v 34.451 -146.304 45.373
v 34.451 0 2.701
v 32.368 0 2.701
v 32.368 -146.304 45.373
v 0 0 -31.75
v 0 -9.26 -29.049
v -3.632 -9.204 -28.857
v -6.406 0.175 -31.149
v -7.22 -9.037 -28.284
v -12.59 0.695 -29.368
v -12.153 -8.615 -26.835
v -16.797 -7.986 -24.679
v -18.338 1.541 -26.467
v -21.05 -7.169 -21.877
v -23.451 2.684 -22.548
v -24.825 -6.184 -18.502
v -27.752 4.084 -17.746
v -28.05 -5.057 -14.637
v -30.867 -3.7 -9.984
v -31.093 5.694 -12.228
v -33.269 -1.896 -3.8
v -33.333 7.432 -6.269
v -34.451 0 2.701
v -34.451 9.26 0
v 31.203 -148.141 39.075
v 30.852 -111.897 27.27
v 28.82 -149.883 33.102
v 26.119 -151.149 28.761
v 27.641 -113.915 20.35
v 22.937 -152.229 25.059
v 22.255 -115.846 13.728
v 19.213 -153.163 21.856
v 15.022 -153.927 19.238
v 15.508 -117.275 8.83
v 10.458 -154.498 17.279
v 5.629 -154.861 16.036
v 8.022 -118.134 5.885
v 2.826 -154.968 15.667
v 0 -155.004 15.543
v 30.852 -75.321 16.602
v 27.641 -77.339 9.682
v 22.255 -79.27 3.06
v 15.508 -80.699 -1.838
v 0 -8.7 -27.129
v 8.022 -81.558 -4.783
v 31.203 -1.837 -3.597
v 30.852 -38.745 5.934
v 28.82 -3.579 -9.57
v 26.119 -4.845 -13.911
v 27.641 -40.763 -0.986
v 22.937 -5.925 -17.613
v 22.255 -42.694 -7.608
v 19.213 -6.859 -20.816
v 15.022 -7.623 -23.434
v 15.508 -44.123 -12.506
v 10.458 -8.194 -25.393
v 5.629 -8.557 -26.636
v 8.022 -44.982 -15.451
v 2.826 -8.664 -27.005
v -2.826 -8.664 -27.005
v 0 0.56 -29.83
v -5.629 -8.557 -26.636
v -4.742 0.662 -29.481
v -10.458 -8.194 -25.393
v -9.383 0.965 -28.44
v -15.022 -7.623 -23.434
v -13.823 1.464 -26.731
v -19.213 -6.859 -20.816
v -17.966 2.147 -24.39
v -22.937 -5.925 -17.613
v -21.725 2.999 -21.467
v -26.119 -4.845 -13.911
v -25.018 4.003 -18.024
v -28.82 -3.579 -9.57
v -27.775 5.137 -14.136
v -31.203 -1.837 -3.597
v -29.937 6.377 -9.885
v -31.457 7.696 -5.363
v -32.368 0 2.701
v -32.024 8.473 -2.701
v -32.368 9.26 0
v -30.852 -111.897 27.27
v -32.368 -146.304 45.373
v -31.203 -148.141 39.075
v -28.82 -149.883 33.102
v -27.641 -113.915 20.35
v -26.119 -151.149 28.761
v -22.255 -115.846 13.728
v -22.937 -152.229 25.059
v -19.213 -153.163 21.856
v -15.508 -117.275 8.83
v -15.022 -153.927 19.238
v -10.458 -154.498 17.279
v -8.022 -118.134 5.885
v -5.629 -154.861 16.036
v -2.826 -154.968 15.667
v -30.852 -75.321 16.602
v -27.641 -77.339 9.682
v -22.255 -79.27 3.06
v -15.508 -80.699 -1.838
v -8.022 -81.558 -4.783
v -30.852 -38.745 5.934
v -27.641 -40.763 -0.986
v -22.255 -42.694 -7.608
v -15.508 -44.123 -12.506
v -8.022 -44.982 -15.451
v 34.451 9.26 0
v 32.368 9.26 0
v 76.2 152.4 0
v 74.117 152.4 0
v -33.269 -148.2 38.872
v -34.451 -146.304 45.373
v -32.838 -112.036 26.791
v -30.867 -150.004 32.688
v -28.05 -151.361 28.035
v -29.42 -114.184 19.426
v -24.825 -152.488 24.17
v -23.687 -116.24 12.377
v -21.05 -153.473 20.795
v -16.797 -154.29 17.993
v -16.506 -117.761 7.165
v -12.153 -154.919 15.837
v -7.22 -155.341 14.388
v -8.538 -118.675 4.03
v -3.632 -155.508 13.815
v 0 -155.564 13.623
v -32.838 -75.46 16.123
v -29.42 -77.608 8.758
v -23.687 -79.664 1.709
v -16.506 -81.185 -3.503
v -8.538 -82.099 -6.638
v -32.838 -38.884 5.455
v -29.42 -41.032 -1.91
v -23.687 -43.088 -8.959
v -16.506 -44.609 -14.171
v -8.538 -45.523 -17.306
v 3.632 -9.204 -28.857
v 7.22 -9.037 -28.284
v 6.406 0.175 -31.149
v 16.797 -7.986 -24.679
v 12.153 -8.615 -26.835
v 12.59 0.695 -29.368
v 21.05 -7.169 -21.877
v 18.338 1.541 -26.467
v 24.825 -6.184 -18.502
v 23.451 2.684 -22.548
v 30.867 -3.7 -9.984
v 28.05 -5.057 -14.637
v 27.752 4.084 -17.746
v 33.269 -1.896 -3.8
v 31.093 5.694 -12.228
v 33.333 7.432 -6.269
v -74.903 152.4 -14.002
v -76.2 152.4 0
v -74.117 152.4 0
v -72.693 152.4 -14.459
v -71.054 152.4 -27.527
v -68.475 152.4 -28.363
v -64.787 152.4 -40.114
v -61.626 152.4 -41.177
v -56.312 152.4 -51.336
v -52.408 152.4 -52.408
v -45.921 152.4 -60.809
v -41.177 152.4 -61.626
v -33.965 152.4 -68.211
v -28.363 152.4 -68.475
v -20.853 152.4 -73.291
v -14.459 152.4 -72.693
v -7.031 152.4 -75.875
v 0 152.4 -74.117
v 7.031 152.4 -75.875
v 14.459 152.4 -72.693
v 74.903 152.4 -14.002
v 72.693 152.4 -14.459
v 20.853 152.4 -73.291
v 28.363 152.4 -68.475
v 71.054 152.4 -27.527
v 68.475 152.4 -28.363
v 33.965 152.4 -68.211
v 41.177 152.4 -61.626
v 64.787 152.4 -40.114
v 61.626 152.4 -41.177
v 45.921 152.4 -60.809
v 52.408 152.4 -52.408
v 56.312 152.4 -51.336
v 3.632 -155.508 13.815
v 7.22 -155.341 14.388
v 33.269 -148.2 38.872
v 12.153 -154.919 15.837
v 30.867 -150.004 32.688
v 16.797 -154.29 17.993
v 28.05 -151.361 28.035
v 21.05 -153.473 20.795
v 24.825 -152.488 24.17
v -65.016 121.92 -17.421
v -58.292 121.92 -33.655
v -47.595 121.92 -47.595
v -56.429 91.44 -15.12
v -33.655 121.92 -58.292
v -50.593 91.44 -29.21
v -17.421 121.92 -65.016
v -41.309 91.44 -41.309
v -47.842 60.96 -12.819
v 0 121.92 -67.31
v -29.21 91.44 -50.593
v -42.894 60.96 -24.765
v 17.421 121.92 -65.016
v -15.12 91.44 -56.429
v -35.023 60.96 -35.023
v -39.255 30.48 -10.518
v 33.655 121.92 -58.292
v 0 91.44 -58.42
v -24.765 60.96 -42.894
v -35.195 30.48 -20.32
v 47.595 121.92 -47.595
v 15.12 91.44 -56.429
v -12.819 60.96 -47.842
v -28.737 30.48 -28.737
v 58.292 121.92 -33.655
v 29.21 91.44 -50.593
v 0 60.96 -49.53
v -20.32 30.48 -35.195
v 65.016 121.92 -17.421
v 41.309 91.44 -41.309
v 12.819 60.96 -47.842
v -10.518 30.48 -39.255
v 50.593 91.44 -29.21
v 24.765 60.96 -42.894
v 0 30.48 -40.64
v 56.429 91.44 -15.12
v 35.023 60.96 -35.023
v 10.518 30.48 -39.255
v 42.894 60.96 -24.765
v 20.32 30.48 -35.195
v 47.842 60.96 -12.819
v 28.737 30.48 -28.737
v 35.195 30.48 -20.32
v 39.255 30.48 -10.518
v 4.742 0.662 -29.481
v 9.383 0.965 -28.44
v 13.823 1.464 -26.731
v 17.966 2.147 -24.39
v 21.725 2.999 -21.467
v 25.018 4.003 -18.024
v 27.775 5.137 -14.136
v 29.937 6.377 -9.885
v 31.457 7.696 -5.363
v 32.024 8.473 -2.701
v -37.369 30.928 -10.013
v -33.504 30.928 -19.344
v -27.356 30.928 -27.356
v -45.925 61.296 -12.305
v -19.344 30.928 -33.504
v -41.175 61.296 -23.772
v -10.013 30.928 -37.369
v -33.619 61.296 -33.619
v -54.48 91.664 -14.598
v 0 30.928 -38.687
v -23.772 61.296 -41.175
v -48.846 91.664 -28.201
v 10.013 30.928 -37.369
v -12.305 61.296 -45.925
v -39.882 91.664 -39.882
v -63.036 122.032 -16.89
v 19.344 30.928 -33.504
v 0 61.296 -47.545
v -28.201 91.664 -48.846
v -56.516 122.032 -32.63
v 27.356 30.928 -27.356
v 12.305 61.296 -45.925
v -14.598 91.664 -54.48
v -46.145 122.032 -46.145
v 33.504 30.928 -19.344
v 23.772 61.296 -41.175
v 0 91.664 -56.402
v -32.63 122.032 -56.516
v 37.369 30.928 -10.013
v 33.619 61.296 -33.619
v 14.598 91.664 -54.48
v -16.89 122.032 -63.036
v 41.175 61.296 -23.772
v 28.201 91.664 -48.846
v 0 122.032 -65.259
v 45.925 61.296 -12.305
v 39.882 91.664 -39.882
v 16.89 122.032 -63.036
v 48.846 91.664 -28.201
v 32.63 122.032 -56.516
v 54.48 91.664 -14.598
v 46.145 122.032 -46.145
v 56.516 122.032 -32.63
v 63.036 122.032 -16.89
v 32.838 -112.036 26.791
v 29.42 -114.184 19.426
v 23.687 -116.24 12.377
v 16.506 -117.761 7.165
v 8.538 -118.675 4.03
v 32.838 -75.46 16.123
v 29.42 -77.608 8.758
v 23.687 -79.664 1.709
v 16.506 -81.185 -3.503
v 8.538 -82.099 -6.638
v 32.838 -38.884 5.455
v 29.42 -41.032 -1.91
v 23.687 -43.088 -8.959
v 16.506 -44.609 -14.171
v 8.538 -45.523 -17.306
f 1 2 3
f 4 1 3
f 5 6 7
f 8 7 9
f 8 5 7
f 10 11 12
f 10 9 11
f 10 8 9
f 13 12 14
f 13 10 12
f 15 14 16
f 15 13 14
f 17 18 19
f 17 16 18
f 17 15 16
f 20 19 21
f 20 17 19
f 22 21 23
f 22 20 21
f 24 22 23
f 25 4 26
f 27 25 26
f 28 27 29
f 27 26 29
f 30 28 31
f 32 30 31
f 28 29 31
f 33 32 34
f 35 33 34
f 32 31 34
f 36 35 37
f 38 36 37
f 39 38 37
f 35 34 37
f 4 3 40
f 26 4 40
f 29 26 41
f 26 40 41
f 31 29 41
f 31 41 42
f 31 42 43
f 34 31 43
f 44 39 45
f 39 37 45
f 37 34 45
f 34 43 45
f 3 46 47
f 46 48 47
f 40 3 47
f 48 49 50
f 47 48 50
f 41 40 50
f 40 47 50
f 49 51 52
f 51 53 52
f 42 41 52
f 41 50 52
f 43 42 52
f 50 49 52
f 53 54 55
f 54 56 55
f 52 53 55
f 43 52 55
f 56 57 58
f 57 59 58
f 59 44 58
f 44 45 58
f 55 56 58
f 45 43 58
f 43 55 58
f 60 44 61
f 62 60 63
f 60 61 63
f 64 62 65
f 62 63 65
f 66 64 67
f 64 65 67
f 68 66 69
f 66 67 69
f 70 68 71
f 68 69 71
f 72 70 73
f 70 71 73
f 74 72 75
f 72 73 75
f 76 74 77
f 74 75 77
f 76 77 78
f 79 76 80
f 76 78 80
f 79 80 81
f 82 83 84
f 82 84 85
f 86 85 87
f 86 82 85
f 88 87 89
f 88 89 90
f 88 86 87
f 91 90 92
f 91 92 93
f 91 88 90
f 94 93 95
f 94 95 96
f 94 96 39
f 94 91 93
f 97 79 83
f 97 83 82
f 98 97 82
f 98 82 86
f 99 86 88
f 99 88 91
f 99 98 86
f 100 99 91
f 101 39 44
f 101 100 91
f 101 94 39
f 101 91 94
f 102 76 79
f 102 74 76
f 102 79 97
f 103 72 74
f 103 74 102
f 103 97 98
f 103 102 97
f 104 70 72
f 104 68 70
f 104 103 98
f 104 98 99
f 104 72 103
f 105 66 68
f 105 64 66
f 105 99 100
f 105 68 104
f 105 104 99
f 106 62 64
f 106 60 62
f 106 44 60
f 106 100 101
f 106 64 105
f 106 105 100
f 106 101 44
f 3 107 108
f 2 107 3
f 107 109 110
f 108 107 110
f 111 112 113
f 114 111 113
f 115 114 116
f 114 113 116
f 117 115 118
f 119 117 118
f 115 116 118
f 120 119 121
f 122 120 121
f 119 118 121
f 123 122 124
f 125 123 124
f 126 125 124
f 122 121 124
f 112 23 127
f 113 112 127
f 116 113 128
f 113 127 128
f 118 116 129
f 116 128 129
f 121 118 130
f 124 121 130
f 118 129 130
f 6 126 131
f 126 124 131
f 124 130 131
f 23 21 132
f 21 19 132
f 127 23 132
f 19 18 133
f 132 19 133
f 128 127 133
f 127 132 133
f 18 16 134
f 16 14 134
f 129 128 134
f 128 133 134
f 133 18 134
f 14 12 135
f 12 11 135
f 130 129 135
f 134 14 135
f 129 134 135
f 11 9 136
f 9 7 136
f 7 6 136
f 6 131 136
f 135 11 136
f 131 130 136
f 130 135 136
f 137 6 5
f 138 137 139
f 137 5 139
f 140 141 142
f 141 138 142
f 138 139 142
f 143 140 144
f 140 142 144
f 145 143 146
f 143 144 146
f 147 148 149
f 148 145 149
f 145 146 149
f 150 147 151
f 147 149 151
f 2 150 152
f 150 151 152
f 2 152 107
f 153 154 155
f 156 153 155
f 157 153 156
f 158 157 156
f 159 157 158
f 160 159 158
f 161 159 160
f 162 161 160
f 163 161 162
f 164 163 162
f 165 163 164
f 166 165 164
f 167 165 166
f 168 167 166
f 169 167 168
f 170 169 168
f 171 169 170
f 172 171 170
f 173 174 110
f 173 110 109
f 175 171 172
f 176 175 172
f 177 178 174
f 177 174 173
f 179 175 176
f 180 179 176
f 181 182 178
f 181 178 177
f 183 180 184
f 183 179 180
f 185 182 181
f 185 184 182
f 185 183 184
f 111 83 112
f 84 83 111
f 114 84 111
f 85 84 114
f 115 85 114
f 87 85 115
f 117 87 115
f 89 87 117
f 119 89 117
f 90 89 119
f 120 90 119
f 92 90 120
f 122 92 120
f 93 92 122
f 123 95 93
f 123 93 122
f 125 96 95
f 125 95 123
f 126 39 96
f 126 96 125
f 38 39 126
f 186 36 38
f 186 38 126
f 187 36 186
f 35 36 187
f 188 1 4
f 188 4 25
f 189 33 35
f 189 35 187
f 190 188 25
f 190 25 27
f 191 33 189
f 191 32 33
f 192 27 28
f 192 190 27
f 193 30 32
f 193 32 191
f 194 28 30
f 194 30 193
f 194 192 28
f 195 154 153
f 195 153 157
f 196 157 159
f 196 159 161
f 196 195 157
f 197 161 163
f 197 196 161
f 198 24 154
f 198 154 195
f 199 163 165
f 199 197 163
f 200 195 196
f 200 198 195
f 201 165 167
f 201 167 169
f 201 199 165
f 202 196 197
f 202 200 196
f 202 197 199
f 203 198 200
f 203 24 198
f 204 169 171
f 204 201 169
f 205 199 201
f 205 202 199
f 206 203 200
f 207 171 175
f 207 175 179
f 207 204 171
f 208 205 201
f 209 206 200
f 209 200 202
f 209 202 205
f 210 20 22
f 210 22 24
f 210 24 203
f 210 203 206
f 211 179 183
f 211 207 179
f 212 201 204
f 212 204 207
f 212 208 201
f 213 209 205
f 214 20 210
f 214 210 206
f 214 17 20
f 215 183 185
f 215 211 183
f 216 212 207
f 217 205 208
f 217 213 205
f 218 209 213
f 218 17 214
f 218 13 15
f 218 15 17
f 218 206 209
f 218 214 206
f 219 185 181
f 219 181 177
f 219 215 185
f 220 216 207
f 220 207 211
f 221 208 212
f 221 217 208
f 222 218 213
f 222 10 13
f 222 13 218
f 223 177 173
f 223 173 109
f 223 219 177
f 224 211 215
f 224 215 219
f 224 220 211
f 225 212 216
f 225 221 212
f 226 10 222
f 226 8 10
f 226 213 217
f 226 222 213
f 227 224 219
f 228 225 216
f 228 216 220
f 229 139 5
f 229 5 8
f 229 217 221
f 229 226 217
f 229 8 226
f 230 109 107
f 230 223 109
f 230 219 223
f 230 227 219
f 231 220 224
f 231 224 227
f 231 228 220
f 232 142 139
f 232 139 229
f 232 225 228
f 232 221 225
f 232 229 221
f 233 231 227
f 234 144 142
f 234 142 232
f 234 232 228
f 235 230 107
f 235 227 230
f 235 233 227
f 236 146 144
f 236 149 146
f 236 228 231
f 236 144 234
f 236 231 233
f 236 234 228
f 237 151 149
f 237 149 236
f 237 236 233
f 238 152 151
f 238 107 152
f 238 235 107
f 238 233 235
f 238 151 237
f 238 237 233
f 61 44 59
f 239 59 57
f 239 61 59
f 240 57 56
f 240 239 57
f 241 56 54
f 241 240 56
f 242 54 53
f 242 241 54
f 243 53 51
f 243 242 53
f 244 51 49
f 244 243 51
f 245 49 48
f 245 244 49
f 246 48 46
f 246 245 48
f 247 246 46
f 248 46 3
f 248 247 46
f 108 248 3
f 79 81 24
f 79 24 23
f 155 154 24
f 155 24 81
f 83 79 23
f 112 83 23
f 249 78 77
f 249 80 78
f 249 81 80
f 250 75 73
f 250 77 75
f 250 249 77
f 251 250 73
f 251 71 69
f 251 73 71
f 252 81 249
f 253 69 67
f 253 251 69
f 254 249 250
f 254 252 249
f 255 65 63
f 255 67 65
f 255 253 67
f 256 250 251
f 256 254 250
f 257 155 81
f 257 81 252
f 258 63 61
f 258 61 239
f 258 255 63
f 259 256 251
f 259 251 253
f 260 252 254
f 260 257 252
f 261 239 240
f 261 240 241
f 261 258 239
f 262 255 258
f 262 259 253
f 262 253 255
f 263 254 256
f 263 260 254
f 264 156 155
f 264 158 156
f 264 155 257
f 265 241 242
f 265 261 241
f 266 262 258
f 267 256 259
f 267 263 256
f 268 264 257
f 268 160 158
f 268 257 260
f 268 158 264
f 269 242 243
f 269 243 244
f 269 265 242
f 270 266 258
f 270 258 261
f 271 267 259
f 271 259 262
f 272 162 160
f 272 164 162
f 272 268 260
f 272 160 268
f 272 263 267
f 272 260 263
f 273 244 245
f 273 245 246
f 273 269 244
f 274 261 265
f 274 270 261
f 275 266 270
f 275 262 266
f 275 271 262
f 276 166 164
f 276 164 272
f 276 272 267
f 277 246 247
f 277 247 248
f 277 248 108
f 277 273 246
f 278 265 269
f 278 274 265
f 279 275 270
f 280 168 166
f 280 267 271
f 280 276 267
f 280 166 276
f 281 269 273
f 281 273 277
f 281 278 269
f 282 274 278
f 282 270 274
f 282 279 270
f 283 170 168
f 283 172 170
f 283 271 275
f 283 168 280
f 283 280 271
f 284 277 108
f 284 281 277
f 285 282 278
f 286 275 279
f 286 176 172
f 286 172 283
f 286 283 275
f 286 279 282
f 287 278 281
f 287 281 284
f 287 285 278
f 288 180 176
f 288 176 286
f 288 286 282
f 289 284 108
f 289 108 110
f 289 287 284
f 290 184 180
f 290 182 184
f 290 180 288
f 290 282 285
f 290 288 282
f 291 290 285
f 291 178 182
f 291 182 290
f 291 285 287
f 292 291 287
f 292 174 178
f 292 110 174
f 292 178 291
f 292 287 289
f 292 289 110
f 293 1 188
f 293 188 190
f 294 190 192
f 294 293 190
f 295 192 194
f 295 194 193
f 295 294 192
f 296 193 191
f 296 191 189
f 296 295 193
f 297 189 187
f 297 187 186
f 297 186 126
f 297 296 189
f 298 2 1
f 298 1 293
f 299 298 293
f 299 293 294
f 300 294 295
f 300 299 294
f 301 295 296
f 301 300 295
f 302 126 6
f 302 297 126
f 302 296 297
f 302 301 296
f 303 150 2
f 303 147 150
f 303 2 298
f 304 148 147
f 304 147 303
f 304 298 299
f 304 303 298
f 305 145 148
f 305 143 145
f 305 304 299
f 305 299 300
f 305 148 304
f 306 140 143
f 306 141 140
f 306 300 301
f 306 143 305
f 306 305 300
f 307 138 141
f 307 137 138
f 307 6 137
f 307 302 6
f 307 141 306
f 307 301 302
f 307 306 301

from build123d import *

# Parameters (mm, degrees)
F1_ANGLE      = 180
F3_DEPTH      = 44.6
F3_DEPTH_BACK = 39.8
F4_DEPTH      = 25
F5_DEPTH      = 25
F6_DEPTH      = 152.4


with BuildPart() as f1:
    # F0 (on Top) → F1 (revolve)
    with BuildSketch(Plane.XY):
        Polygon((-31.75, 0), (-29.6666666667, 0), (-74.1166666667, 152.4), (-76.2, 152.4), align=None)
    revolve(axis=Axis((0, 76.2, 0), (0, -1, 0)), revolution_arc=F1_ANGLE)

    # F2 (on Right) → F3 (join, two sides)
    with BuildSketch(Plane.YZ) as f3_sk:
        Polygon((-9.2604166667, -29.0490451389), (0, -31.75), (9.2604166667, 0), (0, 2.7009548611), align=None)
    extrude(amount=F3_DEPTH)
    extrude(f3_sk.sketch, amount=-F3_DEPTH_BACK)

    # F4 (cut): faces of the model
    f4_faces = [f1.faces().sort_by_distance(p)[0] for p in [
        (33.8924298462, 3.5692640267, -19.5125233371),
        (-30.9009295453, 3.1872250967, -20.8223710971),
    ]]
    extrude(f4_faces, amount=-F4_DEPTH, mode=Mode.SUBTRACT)

    # F5 (cut): a face of the model
    f5_faces = [f1.faces().sort_by_distance(p)[0] for p in [
        (0, 5.5929259121, -12.5742540156),
    ]]
    extrude(f5_faces, amount=-F5_DEPTH, mode=Mode.SUBTRACT)

    # F6 (add): a face of the model
    f6_faces = [f1.faces().sort_by_distance(p)[0] for p in [
        (33.4092881944, -0.2139993496, 1.9672428053),
    ]]
    extrude(f6_faces, amount=F6_DEPTH)


solid = f1.part
